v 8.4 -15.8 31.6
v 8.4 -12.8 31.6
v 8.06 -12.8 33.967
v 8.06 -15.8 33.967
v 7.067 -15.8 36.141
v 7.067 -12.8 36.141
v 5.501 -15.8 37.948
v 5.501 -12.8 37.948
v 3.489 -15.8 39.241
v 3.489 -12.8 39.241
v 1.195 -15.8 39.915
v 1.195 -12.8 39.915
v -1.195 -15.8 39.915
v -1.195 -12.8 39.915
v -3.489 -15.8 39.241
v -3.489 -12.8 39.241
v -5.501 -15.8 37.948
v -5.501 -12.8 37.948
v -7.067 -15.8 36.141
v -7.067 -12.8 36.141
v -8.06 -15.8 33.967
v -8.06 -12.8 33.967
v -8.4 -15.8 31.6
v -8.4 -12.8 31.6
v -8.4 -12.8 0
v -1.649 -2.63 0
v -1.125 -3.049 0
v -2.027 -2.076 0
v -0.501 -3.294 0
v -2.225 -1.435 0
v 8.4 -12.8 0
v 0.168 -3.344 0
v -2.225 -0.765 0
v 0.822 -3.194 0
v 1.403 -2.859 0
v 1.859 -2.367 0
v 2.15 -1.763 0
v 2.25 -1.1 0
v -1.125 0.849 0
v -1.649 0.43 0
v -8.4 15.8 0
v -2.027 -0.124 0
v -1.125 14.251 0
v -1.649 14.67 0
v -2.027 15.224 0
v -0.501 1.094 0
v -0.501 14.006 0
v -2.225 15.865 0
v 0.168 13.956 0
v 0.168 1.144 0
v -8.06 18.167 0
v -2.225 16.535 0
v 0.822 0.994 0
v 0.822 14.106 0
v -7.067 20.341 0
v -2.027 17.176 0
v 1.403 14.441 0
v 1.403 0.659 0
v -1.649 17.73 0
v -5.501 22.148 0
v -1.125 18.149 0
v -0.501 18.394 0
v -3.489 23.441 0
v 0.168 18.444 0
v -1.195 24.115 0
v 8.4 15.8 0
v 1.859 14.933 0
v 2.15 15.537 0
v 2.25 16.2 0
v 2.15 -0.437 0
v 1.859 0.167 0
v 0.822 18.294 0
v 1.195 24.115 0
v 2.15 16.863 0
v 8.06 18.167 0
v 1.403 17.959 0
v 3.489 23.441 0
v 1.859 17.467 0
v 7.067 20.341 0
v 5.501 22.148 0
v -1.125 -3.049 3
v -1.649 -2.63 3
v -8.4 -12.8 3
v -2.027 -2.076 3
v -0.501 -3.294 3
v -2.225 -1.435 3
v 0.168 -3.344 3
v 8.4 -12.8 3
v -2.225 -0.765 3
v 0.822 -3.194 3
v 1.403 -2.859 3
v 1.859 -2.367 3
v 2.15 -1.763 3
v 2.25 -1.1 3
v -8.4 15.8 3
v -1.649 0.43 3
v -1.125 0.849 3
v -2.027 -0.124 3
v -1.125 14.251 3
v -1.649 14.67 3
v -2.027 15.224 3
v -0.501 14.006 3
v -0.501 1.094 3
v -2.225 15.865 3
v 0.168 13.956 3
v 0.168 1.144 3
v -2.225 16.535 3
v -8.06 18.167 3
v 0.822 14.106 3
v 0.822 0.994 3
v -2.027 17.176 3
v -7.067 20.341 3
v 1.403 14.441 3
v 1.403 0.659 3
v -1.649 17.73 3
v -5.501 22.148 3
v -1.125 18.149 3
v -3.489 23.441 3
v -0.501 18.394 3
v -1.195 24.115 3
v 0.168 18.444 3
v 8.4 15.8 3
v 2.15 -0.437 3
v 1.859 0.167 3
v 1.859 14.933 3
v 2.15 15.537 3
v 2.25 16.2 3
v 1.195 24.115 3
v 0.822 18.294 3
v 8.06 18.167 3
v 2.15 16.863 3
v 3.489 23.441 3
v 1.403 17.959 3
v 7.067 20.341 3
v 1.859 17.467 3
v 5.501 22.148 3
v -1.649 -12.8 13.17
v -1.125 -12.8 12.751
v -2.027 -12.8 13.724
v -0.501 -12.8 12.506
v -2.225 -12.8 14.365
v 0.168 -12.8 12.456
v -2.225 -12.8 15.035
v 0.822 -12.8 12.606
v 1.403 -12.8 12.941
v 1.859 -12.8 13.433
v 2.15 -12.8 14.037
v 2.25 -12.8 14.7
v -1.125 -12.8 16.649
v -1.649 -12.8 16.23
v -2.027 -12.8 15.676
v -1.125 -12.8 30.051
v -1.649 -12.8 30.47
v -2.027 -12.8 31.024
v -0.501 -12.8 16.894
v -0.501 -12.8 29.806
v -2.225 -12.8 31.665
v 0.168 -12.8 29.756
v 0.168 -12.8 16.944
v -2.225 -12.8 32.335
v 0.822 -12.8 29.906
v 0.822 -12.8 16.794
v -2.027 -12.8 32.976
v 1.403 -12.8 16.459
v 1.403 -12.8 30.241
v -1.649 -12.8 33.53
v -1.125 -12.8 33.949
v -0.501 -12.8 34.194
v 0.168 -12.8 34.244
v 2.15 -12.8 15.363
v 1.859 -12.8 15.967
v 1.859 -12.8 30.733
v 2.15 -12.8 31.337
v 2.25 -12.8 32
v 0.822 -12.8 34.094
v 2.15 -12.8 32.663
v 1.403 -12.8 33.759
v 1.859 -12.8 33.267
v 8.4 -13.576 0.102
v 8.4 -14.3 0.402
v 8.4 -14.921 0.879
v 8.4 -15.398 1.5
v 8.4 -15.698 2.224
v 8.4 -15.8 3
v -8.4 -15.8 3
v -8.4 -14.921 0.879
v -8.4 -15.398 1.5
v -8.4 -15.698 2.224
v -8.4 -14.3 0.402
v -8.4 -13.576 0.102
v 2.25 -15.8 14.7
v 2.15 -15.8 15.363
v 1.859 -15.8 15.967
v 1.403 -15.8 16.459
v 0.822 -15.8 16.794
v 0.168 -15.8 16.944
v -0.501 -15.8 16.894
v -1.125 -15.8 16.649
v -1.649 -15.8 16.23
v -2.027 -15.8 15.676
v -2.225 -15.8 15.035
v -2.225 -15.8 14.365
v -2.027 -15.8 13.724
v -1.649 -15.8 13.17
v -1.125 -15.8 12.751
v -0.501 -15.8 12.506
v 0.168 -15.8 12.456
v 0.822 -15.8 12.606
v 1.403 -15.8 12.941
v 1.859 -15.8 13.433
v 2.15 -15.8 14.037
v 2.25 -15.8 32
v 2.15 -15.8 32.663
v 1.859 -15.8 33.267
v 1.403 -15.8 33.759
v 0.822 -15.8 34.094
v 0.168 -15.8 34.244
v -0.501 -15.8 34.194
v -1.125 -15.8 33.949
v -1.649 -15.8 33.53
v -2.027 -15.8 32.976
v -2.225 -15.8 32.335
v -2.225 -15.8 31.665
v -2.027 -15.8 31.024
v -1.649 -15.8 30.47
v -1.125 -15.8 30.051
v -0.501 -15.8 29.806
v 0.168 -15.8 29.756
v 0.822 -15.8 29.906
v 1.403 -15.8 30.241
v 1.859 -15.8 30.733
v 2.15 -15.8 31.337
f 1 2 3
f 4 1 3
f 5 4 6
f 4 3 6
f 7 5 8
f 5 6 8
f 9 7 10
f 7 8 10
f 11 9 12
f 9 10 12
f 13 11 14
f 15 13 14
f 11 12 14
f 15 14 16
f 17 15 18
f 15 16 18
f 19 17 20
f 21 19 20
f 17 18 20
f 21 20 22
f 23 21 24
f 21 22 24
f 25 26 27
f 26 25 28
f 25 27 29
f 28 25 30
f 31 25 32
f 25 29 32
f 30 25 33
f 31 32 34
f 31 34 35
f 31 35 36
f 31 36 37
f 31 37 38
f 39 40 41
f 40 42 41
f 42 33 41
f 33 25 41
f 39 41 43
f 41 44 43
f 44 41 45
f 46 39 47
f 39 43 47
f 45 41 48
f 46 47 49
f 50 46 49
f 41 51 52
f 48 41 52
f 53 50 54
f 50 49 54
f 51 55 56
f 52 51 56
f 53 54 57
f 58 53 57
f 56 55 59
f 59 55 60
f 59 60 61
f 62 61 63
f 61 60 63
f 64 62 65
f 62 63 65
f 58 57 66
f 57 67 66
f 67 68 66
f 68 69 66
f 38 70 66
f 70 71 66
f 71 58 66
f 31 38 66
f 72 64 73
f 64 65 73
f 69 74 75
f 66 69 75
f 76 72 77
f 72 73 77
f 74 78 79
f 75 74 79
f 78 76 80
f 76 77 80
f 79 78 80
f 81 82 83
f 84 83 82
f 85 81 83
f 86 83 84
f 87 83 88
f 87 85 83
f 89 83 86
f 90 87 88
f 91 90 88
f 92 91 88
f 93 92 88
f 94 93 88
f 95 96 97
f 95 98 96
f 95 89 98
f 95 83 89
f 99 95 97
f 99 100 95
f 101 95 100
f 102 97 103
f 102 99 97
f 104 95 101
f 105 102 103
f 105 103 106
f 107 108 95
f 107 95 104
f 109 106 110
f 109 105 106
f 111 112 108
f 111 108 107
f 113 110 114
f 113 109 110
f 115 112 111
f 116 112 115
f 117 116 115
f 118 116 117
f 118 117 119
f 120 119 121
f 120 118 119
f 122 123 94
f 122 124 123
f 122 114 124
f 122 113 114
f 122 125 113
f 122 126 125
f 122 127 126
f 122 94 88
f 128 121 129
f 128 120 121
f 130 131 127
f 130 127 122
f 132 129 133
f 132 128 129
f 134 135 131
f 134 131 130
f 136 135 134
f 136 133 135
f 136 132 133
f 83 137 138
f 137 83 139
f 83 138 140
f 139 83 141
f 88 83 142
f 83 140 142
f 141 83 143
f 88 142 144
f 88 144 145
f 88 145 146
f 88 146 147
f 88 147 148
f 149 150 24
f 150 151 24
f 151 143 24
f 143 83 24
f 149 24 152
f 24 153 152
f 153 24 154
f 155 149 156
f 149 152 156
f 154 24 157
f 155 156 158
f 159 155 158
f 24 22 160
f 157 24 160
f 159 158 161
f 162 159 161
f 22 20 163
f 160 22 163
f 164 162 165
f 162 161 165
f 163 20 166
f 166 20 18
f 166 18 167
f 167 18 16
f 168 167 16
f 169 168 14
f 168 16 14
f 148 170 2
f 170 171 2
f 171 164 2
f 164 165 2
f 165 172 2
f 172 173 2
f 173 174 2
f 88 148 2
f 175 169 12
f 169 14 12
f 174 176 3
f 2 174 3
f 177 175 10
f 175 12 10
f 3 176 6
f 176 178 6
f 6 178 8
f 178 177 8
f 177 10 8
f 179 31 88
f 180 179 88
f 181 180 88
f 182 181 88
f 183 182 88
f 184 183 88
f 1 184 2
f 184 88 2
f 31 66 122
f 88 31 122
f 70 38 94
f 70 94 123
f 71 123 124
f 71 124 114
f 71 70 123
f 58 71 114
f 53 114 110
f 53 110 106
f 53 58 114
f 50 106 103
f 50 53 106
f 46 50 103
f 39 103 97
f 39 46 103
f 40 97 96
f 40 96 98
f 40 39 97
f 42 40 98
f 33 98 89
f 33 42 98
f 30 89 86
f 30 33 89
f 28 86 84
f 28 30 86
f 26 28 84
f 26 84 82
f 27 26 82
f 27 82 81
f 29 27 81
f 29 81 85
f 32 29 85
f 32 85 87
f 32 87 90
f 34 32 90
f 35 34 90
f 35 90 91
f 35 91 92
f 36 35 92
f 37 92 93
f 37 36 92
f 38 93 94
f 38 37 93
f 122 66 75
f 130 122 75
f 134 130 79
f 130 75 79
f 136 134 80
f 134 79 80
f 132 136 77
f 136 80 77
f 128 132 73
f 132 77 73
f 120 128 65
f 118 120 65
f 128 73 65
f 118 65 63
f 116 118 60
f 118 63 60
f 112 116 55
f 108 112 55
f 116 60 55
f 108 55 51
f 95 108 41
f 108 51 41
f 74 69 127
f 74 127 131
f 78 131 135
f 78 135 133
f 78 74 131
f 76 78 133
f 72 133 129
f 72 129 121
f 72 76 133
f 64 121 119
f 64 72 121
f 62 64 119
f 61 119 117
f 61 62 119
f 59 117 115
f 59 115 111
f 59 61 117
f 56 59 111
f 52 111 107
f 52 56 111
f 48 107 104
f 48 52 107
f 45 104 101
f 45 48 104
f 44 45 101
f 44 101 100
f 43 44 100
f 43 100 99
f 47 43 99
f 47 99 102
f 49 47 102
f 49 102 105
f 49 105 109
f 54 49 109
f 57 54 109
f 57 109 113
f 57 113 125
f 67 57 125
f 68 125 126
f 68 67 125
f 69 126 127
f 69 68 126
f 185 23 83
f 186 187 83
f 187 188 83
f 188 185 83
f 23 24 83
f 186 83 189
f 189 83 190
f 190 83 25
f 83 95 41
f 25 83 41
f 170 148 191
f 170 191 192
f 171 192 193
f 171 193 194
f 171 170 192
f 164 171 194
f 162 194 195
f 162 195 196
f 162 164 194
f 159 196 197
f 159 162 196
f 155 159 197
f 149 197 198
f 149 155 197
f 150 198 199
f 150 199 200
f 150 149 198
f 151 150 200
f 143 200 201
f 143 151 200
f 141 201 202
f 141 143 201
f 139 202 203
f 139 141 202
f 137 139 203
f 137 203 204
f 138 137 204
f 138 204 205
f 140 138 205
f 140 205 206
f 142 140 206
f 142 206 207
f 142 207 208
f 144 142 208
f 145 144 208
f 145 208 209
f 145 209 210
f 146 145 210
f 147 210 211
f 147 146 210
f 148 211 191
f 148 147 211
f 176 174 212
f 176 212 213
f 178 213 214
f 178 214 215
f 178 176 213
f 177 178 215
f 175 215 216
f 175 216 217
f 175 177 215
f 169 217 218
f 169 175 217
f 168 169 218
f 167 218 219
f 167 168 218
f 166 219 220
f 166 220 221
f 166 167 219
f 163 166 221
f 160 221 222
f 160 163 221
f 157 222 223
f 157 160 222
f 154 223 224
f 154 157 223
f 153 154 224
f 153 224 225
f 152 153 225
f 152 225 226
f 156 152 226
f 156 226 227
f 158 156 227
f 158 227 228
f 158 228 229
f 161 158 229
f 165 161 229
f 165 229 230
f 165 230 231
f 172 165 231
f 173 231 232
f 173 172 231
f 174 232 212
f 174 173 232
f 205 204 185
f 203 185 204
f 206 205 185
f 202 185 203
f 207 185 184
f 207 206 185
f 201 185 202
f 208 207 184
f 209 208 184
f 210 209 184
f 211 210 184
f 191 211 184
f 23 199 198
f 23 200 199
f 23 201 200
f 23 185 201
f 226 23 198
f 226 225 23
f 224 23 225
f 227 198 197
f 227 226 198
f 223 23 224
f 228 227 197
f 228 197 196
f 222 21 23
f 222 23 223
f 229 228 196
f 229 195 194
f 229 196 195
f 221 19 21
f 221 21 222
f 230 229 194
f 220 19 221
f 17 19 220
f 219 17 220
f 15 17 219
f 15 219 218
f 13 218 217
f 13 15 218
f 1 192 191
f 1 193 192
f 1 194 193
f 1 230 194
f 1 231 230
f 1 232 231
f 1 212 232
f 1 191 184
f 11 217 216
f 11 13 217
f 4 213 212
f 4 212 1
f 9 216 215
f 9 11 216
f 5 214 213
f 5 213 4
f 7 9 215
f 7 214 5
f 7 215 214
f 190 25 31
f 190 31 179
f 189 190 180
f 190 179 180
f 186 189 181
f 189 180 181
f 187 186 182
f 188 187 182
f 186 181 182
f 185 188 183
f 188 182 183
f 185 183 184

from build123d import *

# Parameters (mm, degrees)
SKETCH1_R           = 2.25
BOSS_EXTRUDE1_DEPTH = 3
CIRPATTERN1_COUNT   = 2
CIRPATTERN1_ANGLE   = 90
FILLET1_R           = 3


with BuildPart() as part:
    # Sketch1 → Boss-Extrude1 (new body)
    with BuildSketch(Plane.XY):
        with BuildLine():
            Line((-8.4, 15.8), (-8.4, -15.8))
            Line((-8.4, -15.8), (8.4, -15.8))
            Line((8.4, -15.8), (8.4, 15.8))
            ThreePointArc((8.4, 15.8), (0, 24.2), (-8.4, 15.8))
        make_face()
        with Locations((0, 16.2)):
            Circle(SKETCH1_R, mode=Mode.SUBTRACT)
        with Locations((0, -1.1)):
            Circle(SKETCH1_R, mode=Mode.SUBTRACT)
    boss_extrude1 = extrude(amount=BOSS_EXTRUDE1_DEPTH)

    # CirPattern1: Boss-Extrude1 ×2 about axis
    cirpattern1_axis = Axis((-9.24, -14.3, 1.5), (1, 0, 0))
    for i in range(1, CIRPATTERN1_COUNT):
        add(boss_extrude1.rotate(cirpattern1_axis, i * CIRPATTERN1_ANGLE / (CIRPATTERN1_COUNT - 1)))

    # Fillet1
    fillet1_edges = [part.edges().sort_by_distance(p)[0] for p in [
        (0, -15.8, 0),
    ]]
    fillet(fillet1_edges, radius=FILLET1_R)


solid = part.part
